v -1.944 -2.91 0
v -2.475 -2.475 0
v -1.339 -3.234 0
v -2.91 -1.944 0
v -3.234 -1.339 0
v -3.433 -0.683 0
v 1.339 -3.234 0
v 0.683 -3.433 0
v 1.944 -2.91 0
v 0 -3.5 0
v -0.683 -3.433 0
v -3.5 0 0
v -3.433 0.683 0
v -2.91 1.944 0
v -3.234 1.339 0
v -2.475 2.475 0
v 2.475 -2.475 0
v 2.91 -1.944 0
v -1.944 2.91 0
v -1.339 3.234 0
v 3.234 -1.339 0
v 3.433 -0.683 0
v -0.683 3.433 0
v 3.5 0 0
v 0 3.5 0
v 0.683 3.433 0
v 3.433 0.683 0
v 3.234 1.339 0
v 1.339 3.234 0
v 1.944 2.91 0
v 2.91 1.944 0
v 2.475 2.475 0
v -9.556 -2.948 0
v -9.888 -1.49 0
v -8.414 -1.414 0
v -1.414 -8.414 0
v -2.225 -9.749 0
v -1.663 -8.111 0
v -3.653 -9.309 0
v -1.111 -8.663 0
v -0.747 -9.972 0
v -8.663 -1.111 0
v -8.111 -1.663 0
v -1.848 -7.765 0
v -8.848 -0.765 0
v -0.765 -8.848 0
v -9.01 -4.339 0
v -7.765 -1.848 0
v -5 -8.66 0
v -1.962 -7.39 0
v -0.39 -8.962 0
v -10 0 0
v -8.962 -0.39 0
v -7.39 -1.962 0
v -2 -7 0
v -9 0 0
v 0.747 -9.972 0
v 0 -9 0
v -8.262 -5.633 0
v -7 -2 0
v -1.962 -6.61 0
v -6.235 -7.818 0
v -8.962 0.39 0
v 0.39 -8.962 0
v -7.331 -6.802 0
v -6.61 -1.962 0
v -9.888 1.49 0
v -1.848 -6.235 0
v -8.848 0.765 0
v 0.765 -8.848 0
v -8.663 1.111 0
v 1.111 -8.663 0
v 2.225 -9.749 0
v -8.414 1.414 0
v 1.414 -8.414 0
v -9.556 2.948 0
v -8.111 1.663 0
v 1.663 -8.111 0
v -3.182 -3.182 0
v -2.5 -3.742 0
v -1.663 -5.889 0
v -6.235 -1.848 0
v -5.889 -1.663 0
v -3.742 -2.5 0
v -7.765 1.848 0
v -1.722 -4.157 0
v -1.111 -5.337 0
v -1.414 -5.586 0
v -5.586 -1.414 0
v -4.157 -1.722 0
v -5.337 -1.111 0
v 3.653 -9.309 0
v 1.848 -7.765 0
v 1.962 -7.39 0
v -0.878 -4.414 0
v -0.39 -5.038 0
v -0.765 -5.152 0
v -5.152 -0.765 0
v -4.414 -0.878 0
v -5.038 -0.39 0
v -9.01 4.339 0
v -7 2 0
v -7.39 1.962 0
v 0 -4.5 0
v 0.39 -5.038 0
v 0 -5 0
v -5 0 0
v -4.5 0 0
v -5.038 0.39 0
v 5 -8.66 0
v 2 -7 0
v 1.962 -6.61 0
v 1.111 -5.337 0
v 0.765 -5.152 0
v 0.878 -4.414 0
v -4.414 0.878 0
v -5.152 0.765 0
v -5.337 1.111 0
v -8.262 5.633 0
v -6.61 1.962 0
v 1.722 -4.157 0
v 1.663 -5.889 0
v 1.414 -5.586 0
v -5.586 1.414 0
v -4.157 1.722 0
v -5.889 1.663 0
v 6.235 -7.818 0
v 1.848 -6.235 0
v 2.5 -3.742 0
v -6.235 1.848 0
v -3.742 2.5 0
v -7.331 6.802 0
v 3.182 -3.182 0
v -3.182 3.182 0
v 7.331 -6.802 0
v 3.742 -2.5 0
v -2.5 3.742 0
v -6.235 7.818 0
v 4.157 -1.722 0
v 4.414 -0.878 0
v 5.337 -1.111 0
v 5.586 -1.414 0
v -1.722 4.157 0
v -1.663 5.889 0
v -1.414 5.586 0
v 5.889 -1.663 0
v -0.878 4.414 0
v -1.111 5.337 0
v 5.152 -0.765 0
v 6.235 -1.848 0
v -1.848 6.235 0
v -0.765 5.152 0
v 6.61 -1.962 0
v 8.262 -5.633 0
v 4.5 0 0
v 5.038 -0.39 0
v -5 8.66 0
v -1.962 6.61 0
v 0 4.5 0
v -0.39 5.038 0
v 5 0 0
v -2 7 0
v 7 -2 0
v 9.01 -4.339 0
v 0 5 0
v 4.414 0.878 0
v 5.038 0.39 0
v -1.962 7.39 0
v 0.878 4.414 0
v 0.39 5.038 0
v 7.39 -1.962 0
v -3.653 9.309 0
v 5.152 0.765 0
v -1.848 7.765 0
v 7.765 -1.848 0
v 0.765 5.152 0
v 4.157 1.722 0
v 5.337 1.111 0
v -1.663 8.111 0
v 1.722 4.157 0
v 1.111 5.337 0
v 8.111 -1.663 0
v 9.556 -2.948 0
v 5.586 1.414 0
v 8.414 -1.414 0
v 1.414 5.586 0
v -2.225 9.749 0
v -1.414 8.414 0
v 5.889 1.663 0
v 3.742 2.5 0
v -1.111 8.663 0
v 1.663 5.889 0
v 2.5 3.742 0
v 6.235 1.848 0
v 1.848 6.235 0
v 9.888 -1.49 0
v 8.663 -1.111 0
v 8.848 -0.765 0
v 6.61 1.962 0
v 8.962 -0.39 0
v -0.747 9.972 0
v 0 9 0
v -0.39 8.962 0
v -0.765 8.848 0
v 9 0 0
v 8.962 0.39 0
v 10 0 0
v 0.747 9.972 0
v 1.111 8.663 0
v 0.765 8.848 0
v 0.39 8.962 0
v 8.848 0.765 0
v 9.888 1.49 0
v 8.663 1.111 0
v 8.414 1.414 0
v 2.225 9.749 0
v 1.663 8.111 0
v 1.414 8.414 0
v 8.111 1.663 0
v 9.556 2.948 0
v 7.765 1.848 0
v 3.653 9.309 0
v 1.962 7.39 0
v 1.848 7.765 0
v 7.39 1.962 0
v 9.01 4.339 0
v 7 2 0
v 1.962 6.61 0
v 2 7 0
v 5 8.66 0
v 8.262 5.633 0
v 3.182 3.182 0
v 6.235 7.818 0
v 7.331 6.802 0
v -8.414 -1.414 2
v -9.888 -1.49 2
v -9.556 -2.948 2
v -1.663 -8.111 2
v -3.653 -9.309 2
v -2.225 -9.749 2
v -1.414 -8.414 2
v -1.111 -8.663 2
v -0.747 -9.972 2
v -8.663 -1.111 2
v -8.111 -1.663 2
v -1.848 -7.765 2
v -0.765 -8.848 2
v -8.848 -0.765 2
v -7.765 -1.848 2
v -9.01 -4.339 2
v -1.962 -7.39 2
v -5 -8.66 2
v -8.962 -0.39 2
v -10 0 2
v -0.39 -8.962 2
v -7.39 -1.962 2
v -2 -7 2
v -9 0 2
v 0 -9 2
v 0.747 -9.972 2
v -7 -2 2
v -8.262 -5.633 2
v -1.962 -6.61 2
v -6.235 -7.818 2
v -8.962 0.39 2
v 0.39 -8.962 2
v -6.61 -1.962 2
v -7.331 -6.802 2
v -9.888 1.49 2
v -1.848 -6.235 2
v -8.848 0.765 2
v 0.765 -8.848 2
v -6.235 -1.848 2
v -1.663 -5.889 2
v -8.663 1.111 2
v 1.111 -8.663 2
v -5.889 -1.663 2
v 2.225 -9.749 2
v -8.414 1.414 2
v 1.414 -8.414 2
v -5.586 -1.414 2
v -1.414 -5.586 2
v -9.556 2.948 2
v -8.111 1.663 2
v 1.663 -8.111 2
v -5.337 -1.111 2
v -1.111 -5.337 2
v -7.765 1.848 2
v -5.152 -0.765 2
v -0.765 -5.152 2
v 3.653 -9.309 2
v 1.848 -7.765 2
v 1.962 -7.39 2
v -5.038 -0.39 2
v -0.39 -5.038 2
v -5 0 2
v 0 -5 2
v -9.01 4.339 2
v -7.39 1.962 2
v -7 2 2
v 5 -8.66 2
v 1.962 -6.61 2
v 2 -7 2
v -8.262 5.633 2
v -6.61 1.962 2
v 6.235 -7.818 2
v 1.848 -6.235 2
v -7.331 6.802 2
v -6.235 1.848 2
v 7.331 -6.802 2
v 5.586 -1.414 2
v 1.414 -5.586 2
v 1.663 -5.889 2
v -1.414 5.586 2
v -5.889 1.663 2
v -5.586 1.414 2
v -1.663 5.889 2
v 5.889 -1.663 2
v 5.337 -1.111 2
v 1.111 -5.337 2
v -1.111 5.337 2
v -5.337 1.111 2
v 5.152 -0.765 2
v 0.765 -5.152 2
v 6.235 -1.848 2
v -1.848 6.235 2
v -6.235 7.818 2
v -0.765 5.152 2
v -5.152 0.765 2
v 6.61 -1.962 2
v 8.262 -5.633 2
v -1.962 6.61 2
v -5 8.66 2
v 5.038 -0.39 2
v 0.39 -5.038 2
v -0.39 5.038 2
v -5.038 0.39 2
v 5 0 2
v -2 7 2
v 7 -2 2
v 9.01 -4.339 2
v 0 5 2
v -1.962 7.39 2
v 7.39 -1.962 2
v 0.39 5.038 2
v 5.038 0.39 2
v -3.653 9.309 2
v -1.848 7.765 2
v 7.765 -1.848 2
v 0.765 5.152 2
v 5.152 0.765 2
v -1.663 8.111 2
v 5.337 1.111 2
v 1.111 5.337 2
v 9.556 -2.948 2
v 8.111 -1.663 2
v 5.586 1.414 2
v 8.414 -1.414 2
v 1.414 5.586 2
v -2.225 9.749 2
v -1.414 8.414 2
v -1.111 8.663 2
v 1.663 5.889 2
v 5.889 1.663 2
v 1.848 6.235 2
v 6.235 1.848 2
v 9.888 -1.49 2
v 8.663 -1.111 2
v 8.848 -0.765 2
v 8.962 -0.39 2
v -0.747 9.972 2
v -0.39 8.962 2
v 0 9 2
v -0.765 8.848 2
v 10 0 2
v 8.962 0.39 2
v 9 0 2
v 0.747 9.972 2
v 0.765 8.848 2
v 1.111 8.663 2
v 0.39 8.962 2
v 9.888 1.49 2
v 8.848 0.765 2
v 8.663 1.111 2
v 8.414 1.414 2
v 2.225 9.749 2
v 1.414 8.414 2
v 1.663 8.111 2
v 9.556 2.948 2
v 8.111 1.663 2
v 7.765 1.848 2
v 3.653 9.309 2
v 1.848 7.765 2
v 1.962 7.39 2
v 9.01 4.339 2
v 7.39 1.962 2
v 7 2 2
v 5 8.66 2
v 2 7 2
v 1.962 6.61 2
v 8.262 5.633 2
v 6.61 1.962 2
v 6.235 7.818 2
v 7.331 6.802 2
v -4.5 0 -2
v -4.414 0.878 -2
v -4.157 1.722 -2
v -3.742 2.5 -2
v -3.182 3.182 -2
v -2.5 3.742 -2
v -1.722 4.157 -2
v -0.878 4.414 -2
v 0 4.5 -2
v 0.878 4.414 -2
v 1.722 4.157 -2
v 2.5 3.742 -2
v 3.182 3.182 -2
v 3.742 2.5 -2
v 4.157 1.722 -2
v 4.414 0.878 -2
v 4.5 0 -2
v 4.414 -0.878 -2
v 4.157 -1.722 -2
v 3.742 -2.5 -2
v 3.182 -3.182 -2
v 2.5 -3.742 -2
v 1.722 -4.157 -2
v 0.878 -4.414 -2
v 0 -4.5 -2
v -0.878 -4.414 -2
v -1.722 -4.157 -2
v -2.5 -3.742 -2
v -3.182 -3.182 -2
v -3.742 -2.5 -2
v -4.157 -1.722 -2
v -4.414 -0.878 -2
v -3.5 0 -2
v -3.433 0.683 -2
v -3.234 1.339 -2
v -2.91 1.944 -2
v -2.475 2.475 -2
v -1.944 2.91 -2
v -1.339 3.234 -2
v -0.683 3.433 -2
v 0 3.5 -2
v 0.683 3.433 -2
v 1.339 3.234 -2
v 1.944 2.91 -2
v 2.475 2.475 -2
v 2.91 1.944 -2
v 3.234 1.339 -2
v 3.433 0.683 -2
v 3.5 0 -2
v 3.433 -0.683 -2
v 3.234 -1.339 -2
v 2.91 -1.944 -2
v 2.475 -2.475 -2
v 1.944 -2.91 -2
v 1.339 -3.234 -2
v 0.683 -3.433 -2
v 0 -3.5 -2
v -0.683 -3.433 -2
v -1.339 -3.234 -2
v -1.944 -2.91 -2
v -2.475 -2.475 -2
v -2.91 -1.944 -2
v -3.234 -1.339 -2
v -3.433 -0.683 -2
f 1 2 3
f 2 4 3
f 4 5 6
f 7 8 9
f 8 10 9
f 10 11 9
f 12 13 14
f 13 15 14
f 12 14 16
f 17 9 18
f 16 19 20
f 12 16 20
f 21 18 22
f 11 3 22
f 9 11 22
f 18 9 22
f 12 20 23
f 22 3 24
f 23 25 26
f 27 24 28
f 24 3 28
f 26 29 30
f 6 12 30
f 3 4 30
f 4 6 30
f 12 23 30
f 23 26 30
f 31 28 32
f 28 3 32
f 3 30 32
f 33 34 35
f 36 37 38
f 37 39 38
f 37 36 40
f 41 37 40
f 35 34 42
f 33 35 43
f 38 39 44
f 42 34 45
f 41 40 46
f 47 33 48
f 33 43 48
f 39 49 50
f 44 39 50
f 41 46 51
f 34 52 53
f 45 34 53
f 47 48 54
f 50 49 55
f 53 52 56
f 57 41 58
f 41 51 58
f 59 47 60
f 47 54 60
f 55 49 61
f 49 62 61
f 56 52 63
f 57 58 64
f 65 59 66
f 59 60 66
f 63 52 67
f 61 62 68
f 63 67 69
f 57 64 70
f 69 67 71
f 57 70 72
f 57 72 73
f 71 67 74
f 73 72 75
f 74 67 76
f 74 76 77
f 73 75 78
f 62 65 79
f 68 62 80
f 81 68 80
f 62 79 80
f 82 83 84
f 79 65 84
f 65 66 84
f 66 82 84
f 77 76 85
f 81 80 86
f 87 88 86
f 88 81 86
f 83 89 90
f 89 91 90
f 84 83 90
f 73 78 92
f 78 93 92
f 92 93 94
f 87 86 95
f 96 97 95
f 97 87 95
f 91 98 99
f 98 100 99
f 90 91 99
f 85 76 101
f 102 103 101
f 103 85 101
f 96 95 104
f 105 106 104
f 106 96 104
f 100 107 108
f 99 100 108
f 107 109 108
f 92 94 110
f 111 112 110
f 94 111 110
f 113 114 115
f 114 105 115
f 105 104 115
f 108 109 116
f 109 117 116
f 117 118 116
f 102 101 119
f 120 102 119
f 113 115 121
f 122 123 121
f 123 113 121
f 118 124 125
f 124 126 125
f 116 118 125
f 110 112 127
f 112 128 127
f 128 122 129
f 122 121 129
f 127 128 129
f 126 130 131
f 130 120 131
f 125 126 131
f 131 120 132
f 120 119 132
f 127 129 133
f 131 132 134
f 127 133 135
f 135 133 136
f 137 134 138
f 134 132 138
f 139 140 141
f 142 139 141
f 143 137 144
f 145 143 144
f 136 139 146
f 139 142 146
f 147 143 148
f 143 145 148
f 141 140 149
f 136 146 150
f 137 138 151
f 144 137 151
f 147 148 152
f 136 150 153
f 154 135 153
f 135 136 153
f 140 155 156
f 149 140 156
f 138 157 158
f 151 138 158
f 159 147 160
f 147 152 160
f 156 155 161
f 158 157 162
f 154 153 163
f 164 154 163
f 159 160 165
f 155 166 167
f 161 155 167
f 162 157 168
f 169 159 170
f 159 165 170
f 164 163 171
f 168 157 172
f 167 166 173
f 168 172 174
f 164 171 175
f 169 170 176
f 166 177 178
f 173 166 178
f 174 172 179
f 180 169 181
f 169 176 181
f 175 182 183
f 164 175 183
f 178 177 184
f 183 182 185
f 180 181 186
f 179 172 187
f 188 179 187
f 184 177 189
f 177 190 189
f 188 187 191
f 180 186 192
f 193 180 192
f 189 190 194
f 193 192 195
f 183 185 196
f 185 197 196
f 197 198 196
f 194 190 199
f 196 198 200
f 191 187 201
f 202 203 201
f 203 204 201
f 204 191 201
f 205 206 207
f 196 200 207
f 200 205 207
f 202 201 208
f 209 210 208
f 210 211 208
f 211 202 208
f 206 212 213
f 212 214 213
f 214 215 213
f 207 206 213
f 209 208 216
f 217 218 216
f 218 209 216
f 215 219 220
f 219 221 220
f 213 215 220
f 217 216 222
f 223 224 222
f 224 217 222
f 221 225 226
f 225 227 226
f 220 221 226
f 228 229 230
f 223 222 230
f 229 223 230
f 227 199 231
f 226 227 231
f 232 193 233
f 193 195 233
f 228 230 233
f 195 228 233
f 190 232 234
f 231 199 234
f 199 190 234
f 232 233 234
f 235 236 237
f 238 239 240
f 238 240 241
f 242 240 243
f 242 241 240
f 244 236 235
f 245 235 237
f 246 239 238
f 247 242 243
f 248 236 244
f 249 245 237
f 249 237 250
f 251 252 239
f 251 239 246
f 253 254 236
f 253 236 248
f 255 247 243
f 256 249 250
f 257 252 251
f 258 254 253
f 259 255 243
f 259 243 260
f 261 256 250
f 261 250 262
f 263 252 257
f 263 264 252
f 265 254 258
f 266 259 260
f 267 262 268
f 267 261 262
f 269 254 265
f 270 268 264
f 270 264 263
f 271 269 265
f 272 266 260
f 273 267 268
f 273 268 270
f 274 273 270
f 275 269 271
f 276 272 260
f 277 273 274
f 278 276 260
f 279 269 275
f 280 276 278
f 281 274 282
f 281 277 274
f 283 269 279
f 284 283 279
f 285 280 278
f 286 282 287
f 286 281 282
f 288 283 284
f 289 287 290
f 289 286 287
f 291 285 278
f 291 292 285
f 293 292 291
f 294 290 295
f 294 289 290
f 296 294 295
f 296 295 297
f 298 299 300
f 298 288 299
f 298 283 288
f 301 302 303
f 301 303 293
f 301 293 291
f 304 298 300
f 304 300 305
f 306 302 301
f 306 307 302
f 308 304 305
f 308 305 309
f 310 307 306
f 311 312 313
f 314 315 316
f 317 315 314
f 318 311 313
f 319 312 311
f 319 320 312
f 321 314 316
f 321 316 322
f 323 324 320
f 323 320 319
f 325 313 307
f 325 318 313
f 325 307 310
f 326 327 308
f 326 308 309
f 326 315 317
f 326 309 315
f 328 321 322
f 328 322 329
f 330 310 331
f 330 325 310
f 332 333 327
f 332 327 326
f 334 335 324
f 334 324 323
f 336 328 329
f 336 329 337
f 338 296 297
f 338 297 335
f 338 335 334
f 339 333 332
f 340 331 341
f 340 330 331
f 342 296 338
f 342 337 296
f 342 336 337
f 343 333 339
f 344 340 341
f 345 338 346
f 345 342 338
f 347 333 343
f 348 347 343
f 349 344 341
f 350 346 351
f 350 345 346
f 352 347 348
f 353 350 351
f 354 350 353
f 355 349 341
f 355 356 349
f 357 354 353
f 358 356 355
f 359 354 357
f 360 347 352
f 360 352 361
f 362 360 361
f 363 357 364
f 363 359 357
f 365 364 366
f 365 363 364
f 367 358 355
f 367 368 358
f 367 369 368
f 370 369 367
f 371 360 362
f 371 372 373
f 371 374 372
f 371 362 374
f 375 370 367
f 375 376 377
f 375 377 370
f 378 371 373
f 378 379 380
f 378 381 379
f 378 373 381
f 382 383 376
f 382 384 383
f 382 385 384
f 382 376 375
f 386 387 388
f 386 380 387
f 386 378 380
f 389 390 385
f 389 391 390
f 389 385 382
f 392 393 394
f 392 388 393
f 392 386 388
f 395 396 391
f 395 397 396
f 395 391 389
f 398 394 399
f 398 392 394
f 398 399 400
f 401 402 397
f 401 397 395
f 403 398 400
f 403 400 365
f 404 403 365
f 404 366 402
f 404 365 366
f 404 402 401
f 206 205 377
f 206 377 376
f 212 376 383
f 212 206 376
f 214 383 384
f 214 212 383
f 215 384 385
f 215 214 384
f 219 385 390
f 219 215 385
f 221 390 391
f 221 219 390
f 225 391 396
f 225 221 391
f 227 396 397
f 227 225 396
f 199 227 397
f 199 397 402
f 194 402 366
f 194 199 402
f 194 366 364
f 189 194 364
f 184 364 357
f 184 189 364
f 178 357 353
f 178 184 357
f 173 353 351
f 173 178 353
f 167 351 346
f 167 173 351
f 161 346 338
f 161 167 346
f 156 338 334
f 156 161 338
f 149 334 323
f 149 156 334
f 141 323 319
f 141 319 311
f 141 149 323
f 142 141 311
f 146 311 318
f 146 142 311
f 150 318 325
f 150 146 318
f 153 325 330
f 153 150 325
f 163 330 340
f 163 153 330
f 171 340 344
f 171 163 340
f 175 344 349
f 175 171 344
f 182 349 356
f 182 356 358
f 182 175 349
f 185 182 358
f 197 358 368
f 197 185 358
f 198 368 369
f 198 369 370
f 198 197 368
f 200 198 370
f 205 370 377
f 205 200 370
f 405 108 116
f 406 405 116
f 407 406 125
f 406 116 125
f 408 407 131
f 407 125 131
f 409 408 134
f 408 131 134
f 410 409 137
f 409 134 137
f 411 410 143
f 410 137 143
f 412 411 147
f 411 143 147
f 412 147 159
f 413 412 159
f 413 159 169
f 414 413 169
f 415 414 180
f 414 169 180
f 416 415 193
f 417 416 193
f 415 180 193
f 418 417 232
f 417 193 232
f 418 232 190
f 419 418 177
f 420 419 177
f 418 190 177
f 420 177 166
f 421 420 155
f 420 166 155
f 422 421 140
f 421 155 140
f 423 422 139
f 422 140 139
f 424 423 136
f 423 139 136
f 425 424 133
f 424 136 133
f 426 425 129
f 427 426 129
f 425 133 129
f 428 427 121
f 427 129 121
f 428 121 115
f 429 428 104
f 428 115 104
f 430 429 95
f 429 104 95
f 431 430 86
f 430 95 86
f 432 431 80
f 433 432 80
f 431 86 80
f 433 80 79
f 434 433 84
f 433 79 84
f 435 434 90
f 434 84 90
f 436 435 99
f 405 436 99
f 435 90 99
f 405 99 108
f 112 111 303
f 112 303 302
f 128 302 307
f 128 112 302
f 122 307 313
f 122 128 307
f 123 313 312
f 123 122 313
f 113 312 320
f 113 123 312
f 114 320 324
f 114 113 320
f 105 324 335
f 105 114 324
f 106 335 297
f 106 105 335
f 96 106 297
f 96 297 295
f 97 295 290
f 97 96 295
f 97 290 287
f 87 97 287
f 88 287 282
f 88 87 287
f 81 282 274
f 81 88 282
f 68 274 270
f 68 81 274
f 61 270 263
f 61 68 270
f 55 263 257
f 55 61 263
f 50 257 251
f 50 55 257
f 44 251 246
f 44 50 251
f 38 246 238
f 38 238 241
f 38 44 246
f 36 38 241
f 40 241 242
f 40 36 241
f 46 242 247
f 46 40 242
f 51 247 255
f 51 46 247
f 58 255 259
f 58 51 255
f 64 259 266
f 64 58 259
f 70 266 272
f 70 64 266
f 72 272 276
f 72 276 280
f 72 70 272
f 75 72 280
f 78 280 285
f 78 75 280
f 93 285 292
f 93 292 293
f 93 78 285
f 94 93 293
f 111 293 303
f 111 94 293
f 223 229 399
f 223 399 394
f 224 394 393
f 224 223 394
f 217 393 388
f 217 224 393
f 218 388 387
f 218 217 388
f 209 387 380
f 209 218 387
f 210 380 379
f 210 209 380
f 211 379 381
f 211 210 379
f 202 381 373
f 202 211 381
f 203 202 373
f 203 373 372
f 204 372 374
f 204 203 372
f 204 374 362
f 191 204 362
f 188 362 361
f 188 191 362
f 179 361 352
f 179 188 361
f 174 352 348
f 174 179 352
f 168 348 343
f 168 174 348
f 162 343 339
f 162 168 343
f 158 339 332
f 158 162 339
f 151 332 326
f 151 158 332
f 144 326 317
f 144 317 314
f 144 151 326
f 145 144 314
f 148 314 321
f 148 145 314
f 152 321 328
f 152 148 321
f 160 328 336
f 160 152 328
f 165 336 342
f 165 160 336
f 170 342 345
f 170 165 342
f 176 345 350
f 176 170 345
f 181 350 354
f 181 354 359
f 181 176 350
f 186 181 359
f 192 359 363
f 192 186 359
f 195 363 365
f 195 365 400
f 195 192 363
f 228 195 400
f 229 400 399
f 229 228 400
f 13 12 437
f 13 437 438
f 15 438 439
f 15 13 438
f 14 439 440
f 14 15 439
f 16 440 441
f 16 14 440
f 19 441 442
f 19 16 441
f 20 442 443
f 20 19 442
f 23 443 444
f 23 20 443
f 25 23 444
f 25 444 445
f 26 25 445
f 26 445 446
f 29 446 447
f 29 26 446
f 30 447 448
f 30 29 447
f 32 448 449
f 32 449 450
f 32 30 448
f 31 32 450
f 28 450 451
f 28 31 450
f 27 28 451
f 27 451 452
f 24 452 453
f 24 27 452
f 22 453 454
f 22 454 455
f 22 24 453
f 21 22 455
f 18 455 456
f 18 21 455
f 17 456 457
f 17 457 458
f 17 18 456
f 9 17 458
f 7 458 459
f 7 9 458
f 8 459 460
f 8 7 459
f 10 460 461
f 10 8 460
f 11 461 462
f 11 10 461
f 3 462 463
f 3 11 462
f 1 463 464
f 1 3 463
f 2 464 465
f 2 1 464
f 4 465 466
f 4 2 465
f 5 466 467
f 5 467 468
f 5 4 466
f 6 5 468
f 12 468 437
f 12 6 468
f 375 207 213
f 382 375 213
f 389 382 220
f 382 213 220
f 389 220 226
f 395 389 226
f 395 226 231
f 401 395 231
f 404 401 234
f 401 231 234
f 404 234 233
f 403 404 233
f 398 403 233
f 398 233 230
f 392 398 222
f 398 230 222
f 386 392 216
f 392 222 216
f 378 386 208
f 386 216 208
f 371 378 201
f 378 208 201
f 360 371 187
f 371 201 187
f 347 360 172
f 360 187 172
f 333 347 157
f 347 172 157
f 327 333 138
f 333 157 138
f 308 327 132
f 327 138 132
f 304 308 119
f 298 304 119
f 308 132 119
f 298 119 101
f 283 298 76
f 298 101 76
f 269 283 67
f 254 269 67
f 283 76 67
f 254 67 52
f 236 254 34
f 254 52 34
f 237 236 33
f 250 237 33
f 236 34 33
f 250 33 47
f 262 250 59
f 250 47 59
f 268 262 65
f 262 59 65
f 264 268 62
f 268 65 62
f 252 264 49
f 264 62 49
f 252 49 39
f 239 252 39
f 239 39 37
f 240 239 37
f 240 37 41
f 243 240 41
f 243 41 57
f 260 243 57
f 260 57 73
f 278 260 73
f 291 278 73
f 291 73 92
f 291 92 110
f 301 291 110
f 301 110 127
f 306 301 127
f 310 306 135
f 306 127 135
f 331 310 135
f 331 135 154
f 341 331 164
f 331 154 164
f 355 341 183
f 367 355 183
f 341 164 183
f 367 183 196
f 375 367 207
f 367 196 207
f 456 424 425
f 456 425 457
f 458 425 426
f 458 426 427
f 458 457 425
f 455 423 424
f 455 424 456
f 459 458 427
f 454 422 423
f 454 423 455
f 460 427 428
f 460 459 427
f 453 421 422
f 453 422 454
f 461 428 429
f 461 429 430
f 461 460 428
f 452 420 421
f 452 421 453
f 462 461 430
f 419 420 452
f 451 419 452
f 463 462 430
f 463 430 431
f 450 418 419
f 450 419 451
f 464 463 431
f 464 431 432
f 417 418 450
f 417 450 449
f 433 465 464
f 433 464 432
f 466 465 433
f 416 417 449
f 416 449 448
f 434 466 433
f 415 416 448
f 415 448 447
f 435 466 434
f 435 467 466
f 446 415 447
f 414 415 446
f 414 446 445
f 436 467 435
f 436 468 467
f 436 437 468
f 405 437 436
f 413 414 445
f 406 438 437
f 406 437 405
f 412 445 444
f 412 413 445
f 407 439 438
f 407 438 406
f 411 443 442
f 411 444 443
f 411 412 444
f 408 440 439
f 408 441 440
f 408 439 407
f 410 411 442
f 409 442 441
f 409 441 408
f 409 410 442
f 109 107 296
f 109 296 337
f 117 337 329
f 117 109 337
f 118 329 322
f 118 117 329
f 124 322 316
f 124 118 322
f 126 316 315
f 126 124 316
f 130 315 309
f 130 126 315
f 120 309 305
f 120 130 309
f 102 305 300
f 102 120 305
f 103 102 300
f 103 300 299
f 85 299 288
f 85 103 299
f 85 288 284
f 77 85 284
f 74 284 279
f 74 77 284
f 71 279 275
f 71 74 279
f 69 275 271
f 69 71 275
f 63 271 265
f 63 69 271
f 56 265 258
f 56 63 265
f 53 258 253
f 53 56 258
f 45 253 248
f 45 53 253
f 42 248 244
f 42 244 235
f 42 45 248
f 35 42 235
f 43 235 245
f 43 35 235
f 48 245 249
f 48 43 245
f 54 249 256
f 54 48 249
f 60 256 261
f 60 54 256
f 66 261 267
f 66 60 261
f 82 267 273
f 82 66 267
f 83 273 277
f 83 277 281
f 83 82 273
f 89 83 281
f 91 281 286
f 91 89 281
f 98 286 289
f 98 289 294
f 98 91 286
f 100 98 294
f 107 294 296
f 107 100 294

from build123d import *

# Parameters (mm, degrees)
SKETCH1_R           = 10
SKETCH1_R_2         = 2
BOSS_EXTRUDE1_DEPTH = 2
SKETCH2_R           = 4.5
SKETCH2_R_2         = 3.5
BOSS_EXTRUDE2_DEPTH = 2


with BuildPart() as part:
    # Sketch1 → Boss-Extrude1 (new body)
    with BuildSketch(Plane.XY):
        Circle(SKETCH1_R)
        with Locations((7, 0)):
            Circle(SKETCH1_R_2, mode=Mode.SUBTRACT)
        with Locations((0, 7)):
            Circle(SKETCH1_R_2, mode=Mode.SUBTRACT)
        with Locations((-7, 0)):
            Circle(SKETCH1_R_2, mode=Mode.SUBTRACT)
        with Locations((0, -7)):
            Circle(SKETCH1_R_2, mode=Mode.SUBTRACT)
    extrude(amount=BOSS_EXTRUDE1_DEPTH)

    # Sketch2 → Boss-Extrude2 (add)
    with BuildSketch(Plane(origin=(0, 0, 0), x_dir=(-1, 0, 0), z_dir=(0, 0, -1))):
        Circle(SKETCH2_R)
        Circle(SKETCH2_R_2, mode=Mode.SUBTRACT)
    extrude(amount=BOSS_EXTRUDE2_DEPTH)


solid = part.part
